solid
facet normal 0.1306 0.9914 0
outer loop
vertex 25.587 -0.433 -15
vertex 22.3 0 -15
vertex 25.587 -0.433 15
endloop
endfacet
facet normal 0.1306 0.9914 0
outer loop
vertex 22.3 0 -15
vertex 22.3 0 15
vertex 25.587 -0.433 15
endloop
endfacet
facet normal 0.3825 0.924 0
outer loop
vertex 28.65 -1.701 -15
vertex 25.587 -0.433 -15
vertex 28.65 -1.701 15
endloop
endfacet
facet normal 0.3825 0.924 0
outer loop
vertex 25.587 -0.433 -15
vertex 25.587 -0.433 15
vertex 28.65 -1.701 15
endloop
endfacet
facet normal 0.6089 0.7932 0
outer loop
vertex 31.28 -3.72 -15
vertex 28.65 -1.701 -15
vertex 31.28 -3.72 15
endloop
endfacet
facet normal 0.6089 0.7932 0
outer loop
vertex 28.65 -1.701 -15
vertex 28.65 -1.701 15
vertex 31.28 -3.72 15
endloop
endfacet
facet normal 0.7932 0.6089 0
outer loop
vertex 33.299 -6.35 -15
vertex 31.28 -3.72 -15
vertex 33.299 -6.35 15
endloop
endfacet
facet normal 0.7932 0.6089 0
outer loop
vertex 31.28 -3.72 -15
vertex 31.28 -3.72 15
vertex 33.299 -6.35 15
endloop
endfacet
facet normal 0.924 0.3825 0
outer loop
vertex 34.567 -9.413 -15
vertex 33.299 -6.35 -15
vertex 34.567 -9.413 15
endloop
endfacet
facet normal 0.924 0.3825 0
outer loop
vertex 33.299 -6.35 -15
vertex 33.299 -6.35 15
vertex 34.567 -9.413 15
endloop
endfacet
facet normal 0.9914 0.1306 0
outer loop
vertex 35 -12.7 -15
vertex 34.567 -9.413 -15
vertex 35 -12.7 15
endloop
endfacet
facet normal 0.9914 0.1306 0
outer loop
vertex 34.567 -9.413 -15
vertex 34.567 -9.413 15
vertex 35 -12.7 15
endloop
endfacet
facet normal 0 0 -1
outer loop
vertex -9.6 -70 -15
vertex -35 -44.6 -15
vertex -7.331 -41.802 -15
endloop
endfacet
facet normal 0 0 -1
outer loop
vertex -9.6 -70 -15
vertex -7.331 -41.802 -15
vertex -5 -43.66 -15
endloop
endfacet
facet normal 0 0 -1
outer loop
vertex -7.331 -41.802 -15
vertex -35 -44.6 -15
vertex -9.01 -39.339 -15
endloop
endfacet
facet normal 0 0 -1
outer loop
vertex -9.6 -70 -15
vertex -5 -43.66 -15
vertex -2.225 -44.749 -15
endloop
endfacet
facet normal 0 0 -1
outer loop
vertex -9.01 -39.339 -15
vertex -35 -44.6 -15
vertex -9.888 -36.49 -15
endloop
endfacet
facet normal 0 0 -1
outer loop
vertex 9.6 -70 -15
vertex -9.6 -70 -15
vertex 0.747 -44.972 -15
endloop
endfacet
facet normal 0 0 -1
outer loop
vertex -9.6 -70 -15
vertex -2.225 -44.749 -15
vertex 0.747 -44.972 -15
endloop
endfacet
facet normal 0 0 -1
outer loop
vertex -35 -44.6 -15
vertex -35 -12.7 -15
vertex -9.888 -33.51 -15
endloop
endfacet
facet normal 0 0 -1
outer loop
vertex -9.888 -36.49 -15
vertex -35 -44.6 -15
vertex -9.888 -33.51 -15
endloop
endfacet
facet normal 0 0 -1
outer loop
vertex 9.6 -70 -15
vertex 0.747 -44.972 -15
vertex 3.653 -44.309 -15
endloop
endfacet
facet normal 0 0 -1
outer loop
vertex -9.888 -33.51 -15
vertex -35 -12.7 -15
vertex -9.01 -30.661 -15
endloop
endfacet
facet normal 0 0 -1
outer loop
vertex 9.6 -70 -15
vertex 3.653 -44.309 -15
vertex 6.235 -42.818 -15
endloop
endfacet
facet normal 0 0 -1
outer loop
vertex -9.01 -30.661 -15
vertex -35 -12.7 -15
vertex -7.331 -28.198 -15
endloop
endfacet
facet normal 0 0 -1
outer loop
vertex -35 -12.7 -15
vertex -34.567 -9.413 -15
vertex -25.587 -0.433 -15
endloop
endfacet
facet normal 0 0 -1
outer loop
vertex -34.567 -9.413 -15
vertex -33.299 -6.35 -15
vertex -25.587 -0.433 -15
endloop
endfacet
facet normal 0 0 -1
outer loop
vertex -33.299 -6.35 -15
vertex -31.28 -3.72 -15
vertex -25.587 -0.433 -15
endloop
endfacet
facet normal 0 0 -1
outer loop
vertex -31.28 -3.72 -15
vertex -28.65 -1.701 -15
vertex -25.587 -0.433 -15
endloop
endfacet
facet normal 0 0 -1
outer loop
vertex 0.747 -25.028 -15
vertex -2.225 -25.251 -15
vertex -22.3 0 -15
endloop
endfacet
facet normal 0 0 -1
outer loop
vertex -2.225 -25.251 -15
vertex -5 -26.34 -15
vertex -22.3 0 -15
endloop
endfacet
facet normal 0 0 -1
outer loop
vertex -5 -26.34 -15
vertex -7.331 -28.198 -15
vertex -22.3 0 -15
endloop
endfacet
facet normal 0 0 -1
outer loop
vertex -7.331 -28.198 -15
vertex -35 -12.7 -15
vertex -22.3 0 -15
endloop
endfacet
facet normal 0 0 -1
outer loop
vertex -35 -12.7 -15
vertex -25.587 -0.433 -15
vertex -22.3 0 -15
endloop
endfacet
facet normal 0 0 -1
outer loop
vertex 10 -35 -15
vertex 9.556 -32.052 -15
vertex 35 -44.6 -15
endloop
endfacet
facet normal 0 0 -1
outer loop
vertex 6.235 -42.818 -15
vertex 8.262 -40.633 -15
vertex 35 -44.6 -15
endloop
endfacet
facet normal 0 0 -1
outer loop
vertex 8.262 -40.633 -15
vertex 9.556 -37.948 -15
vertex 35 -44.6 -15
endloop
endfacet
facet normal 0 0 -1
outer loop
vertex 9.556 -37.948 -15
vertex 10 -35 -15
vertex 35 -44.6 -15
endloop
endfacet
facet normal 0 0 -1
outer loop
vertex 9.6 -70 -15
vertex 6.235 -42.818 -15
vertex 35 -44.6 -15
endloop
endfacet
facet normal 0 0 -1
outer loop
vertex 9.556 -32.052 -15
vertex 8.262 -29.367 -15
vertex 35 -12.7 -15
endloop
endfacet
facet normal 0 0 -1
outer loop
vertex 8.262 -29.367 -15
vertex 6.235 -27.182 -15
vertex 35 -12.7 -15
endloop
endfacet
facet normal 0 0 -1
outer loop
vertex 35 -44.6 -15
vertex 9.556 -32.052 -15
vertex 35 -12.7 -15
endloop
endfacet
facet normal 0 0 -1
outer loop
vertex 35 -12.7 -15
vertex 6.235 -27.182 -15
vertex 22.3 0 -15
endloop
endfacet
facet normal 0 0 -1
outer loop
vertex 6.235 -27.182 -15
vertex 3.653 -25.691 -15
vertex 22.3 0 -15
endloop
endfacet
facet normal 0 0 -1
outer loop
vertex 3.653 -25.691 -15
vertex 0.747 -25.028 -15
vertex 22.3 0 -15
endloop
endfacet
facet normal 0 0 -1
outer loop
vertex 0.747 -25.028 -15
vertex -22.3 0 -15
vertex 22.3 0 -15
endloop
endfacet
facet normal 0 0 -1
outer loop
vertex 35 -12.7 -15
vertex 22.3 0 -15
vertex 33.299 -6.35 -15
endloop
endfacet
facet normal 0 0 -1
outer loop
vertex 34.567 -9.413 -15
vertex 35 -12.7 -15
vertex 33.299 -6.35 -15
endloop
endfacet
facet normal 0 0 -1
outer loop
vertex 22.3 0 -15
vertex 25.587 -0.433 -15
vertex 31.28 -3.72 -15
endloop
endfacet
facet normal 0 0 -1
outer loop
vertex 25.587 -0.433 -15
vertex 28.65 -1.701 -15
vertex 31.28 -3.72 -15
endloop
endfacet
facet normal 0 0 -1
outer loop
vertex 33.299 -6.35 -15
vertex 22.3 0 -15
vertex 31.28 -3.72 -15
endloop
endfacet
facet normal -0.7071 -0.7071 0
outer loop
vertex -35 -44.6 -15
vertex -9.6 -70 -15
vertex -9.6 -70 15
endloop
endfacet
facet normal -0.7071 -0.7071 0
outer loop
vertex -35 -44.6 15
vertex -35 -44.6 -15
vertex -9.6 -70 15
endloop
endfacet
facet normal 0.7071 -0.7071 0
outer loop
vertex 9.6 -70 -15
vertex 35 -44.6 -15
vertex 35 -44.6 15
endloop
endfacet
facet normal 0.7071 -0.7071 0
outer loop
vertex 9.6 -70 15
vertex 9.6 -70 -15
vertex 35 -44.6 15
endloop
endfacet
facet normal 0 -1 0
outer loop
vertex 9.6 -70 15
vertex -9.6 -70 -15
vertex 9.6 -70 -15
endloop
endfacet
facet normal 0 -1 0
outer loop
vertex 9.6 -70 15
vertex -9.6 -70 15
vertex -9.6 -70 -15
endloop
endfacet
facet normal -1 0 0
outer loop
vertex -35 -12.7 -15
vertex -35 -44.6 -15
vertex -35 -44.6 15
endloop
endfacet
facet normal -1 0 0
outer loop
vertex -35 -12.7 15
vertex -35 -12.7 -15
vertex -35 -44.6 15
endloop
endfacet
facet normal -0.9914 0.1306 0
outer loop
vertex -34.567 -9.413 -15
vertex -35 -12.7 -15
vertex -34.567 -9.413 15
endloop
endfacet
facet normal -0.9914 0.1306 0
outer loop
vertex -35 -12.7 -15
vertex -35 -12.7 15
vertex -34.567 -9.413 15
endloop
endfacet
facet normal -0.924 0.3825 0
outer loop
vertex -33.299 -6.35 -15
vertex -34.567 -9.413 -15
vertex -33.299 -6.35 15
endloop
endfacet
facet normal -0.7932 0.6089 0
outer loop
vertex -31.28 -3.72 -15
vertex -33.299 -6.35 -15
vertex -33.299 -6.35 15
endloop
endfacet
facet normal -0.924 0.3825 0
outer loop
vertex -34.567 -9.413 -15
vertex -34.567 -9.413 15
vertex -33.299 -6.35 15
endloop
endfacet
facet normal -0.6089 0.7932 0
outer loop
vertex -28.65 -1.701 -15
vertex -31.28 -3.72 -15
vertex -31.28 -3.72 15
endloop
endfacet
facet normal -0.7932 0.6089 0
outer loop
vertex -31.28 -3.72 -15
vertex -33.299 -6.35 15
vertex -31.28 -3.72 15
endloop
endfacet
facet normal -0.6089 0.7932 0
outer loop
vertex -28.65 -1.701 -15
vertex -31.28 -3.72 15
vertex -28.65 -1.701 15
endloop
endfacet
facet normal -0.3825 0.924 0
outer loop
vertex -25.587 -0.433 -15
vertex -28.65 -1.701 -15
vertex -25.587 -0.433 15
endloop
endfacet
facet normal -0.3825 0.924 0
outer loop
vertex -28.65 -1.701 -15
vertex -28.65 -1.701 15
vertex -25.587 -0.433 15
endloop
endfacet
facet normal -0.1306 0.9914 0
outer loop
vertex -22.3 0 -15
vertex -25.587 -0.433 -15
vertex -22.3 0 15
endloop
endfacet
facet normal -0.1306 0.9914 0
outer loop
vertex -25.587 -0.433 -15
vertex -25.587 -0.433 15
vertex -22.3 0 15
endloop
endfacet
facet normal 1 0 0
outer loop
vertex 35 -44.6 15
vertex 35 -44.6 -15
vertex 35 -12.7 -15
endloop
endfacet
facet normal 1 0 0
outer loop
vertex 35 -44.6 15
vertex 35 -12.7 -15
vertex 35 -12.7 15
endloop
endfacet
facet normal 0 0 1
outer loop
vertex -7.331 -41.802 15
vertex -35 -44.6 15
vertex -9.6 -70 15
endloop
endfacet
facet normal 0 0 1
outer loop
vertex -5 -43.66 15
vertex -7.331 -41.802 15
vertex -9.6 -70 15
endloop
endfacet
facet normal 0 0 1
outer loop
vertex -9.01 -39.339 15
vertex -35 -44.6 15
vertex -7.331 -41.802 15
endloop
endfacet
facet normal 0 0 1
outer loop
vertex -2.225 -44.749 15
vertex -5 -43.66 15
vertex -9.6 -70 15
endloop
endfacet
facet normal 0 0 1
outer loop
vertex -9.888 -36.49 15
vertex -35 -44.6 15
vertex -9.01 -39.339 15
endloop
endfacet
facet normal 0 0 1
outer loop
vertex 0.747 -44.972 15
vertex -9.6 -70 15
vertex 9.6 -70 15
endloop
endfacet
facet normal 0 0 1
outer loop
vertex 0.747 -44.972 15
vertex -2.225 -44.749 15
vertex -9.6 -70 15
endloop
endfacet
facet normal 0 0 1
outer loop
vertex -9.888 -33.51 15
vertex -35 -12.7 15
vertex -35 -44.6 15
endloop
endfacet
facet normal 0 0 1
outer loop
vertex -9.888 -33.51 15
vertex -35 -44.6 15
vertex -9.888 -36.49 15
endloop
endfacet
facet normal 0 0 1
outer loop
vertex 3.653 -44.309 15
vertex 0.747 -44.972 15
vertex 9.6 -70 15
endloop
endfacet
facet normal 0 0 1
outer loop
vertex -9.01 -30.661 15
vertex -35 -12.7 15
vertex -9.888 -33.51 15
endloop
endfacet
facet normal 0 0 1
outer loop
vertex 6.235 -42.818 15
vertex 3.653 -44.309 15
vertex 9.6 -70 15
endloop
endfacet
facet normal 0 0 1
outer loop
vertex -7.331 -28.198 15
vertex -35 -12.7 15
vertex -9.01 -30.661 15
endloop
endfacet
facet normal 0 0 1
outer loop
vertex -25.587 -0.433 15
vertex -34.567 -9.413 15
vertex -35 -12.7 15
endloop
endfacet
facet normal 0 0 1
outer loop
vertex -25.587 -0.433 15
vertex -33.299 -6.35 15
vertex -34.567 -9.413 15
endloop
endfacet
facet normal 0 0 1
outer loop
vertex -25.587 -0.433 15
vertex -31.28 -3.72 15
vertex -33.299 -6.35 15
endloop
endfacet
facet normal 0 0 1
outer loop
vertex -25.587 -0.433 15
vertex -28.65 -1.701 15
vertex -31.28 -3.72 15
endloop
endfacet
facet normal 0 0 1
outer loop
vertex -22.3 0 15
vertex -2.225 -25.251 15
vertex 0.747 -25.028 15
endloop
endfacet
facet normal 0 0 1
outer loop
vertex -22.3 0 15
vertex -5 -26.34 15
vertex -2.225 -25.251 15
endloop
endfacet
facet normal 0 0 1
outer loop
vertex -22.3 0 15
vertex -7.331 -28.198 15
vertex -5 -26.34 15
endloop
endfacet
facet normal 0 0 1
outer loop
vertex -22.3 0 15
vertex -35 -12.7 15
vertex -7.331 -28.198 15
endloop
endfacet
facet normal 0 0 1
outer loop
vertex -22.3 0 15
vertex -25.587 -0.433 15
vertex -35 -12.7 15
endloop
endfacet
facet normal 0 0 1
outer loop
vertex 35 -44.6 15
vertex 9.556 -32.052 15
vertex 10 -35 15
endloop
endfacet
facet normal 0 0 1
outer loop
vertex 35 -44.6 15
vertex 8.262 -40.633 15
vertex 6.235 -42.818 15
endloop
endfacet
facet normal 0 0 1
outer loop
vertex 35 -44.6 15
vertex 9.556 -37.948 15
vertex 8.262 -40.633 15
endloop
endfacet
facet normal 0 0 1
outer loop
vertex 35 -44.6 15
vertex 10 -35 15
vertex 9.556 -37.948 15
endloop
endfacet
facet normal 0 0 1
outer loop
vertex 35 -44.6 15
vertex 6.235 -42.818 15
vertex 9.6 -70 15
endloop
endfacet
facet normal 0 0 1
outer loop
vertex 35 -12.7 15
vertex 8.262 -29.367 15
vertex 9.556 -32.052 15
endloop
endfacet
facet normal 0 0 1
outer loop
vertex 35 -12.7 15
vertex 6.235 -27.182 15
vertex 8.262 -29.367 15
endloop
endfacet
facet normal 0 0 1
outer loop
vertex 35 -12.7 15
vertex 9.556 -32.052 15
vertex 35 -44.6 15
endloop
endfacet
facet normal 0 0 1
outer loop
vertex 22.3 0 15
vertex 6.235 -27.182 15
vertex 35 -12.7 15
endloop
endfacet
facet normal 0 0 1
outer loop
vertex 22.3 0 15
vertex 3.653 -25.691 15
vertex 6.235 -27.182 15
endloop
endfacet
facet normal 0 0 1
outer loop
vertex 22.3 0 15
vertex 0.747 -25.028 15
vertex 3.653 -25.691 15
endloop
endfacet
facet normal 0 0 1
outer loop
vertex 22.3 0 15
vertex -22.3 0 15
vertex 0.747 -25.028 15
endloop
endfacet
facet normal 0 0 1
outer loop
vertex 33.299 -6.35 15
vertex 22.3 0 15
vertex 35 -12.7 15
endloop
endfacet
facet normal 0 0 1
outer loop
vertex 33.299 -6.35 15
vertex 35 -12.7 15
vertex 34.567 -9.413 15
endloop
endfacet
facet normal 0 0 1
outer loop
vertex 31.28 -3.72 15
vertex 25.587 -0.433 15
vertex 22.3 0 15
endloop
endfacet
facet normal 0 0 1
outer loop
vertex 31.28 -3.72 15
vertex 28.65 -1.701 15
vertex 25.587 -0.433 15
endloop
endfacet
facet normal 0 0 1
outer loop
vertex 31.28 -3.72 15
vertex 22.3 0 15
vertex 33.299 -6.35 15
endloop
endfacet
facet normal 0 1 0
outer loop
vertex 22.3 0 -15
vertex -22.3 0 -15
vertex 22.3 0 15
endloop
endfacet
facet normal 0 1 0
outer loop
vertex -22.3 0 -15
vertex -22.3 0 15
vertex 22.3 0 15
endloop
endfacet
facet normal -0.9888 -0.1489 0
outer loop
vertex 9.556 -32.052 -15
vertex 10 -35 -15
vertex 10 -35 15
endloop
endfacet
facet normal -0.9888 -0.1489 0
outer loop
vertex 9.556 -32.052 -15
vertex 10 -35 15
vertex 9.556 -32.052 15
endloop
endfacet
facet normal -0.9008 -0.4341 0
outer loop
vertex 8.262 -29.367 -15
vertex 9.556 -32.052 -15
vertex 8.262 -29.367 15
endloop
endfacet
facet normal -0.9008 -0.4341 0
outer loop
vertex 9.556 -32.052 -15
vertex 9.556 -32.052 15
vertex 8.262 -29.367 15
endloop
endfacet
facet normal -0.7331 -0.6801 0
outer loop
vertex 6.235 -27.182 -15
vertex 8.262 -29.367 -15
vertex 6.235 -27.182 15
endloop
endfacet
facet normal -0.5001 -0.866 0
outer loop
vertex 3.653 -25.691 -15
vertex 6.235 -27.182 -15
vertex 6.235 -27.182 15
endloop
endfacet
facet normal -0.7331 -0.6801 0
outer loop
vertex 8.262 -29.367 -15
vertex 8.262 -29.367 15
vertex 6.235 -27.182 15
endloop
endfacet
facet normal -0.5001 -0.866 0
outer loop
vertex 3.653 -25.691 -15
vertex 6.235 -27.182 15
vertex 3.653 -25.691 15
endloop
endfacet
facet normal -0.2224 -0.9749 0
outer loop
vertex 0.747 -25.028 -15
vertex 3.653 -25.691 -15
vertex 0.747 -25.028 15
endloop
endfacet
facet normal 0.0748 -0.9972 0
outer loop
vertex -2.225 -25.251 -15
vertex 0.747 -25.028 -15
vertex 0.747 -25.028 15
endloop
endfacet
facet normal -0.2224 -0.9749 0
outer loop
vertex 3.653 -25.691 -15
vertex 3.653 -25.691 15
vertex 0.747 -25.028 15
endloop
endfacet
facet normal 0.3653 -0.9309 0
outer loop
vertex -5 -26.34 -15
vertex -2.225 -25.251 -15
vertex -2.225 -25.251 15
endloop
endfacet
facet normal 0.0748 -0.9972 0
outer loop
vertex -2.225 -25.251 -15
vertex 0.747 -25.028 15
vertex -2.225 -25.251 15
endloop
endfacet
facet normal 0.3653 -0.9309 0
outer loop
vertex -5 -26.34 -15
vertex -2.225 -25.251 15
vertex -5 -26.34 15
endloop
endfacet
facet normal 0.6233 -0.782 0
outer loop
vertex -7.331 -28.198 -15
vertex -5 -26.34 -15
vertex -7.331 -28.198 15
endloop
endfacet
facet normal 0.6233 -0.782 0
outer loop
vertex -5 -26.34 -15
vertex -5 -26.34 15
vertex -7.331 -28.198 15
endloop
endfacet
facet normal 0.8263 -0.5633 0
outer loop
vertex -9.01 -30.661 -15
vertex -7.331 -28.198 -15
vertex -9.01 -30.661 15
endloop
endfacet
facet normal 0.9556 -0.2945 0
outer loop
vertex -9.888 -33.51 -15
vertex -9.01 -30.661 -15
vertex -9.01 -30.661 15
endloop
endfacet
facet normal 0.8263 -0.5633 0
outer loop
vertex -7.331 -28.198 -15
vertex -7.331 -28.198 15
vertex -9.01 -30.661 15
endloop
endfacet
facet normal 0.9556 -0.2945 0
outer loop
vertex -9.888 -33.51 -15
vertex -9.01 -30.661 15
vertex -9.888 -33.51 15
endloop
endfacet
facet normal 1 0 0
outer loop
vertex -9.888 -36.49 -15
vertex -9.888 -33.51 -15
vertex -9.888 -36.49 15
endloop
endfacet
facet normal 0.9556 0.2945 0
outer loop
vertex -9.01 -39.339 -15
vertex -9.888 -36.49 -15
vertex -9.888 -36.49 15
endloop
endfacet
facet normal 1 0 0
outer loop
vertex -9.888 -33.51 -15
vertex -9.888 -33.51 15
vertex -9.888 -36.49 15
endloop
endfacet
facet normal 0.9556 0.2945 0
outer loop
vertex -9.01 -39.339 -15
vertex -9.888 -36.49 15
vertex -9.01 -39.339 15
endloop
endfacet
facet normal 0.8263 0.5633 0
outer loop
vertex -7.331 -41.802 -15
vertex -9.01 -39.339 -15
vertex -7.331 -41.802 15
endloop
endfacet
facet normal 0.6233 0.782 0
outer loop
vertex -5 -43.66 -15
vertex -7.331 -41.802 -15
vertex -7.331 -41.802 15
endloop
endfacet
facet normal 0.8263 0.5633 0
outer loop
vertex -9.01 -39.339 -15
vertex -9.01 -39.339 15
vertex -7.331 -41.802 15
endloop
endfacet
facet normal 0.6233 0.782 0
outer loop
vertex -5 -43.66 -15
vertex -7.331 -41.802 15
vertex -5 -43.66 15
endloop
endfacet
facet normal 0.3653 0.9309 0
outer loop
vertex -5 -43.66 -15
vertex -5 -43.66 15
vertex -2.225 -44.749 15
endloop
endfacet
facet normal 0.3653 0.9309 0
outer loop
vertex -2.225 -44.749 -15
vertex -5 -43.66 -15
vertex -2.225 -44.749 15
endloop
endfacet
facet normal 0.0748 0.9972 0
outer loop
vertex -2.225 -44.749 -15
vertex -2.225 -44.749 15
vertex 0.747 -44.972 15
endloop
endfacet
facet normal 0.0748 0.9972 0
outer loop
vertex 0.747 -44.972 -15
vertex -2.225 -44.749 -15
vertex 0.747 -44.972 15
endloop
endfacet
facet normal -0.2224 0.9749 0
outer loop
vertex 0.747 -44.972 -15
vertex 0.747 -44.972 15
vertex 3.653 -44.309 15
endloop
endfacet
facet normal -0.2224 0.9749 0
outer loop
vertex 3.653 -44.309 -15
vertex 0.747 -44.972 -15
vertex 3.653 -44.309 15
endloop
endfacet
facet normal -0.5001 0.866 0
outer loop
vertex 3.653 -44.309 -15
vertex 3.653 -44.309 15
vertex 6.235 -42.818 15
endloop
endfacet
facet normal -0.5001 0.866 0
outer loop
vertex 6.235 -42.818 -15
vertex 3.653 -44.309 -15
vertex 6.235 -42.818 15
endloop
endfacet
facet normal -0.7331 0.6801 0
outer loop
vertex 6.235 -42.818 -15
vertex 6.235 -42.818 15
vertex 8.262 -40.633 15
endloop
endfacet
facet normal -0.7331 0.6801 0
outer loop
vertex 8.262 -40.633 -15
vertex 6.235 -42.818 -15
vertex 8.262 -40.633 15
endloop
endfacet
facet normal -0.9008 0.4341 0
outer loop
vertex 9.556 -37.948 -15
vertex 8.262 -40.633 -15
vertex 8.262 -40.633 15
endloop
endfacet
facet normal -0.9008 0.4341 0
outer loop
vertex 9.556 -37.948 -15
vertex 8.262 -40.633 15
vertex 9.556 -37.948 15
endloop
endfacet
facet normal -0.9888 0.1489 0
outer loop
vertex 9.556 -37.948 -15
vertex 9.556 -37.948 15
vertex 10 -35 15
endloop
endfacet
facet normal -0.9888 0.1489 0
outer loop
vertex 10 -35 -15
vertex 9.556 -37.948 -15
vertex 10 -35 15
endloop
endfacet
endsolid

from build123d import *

# Parameters (mm, degrees)
F0_W     = 70
F0_H     = 30
F1_DEPTH = 70
F2_R     = 10
F3_DEPTH = 30.001
F4_R     = 12.7
F5_SIZE  = 25.4


with BuildPart() as f1:
    # F0 (on Front) → F1 (new body)
    with BuildSketch(Plane.XZ):
        Rectangle(F0_W, F0_H)
    extrude(amount=F1_DEPTH)

    # F2 (on face) → F3 (cut, through all)
    with BuildSketch(Plane.XY.offset(15)):
        with Locations((0, -35)):
            Circle(F2_R)
    extrude(amount=-F3_DEPTH, mode=Mode.SUBTRACT)

    # F4
    f4_edges = [f1.edges().sort_by_distance(p)[0] for p in [
        (-35, 0, 0),
        (35, 0, 0),
    ]]
    fillet(f4_edges, radius=F4_R)

    # F5
    f5_edges = [f1.edges().sort_by_distance(p)[0] for p in [
        (-35, -70, 0),
        (35, -70, 0),
    ]]
    chamfer(f5_edges, length=F5_SIZE)


solid = f1.part
